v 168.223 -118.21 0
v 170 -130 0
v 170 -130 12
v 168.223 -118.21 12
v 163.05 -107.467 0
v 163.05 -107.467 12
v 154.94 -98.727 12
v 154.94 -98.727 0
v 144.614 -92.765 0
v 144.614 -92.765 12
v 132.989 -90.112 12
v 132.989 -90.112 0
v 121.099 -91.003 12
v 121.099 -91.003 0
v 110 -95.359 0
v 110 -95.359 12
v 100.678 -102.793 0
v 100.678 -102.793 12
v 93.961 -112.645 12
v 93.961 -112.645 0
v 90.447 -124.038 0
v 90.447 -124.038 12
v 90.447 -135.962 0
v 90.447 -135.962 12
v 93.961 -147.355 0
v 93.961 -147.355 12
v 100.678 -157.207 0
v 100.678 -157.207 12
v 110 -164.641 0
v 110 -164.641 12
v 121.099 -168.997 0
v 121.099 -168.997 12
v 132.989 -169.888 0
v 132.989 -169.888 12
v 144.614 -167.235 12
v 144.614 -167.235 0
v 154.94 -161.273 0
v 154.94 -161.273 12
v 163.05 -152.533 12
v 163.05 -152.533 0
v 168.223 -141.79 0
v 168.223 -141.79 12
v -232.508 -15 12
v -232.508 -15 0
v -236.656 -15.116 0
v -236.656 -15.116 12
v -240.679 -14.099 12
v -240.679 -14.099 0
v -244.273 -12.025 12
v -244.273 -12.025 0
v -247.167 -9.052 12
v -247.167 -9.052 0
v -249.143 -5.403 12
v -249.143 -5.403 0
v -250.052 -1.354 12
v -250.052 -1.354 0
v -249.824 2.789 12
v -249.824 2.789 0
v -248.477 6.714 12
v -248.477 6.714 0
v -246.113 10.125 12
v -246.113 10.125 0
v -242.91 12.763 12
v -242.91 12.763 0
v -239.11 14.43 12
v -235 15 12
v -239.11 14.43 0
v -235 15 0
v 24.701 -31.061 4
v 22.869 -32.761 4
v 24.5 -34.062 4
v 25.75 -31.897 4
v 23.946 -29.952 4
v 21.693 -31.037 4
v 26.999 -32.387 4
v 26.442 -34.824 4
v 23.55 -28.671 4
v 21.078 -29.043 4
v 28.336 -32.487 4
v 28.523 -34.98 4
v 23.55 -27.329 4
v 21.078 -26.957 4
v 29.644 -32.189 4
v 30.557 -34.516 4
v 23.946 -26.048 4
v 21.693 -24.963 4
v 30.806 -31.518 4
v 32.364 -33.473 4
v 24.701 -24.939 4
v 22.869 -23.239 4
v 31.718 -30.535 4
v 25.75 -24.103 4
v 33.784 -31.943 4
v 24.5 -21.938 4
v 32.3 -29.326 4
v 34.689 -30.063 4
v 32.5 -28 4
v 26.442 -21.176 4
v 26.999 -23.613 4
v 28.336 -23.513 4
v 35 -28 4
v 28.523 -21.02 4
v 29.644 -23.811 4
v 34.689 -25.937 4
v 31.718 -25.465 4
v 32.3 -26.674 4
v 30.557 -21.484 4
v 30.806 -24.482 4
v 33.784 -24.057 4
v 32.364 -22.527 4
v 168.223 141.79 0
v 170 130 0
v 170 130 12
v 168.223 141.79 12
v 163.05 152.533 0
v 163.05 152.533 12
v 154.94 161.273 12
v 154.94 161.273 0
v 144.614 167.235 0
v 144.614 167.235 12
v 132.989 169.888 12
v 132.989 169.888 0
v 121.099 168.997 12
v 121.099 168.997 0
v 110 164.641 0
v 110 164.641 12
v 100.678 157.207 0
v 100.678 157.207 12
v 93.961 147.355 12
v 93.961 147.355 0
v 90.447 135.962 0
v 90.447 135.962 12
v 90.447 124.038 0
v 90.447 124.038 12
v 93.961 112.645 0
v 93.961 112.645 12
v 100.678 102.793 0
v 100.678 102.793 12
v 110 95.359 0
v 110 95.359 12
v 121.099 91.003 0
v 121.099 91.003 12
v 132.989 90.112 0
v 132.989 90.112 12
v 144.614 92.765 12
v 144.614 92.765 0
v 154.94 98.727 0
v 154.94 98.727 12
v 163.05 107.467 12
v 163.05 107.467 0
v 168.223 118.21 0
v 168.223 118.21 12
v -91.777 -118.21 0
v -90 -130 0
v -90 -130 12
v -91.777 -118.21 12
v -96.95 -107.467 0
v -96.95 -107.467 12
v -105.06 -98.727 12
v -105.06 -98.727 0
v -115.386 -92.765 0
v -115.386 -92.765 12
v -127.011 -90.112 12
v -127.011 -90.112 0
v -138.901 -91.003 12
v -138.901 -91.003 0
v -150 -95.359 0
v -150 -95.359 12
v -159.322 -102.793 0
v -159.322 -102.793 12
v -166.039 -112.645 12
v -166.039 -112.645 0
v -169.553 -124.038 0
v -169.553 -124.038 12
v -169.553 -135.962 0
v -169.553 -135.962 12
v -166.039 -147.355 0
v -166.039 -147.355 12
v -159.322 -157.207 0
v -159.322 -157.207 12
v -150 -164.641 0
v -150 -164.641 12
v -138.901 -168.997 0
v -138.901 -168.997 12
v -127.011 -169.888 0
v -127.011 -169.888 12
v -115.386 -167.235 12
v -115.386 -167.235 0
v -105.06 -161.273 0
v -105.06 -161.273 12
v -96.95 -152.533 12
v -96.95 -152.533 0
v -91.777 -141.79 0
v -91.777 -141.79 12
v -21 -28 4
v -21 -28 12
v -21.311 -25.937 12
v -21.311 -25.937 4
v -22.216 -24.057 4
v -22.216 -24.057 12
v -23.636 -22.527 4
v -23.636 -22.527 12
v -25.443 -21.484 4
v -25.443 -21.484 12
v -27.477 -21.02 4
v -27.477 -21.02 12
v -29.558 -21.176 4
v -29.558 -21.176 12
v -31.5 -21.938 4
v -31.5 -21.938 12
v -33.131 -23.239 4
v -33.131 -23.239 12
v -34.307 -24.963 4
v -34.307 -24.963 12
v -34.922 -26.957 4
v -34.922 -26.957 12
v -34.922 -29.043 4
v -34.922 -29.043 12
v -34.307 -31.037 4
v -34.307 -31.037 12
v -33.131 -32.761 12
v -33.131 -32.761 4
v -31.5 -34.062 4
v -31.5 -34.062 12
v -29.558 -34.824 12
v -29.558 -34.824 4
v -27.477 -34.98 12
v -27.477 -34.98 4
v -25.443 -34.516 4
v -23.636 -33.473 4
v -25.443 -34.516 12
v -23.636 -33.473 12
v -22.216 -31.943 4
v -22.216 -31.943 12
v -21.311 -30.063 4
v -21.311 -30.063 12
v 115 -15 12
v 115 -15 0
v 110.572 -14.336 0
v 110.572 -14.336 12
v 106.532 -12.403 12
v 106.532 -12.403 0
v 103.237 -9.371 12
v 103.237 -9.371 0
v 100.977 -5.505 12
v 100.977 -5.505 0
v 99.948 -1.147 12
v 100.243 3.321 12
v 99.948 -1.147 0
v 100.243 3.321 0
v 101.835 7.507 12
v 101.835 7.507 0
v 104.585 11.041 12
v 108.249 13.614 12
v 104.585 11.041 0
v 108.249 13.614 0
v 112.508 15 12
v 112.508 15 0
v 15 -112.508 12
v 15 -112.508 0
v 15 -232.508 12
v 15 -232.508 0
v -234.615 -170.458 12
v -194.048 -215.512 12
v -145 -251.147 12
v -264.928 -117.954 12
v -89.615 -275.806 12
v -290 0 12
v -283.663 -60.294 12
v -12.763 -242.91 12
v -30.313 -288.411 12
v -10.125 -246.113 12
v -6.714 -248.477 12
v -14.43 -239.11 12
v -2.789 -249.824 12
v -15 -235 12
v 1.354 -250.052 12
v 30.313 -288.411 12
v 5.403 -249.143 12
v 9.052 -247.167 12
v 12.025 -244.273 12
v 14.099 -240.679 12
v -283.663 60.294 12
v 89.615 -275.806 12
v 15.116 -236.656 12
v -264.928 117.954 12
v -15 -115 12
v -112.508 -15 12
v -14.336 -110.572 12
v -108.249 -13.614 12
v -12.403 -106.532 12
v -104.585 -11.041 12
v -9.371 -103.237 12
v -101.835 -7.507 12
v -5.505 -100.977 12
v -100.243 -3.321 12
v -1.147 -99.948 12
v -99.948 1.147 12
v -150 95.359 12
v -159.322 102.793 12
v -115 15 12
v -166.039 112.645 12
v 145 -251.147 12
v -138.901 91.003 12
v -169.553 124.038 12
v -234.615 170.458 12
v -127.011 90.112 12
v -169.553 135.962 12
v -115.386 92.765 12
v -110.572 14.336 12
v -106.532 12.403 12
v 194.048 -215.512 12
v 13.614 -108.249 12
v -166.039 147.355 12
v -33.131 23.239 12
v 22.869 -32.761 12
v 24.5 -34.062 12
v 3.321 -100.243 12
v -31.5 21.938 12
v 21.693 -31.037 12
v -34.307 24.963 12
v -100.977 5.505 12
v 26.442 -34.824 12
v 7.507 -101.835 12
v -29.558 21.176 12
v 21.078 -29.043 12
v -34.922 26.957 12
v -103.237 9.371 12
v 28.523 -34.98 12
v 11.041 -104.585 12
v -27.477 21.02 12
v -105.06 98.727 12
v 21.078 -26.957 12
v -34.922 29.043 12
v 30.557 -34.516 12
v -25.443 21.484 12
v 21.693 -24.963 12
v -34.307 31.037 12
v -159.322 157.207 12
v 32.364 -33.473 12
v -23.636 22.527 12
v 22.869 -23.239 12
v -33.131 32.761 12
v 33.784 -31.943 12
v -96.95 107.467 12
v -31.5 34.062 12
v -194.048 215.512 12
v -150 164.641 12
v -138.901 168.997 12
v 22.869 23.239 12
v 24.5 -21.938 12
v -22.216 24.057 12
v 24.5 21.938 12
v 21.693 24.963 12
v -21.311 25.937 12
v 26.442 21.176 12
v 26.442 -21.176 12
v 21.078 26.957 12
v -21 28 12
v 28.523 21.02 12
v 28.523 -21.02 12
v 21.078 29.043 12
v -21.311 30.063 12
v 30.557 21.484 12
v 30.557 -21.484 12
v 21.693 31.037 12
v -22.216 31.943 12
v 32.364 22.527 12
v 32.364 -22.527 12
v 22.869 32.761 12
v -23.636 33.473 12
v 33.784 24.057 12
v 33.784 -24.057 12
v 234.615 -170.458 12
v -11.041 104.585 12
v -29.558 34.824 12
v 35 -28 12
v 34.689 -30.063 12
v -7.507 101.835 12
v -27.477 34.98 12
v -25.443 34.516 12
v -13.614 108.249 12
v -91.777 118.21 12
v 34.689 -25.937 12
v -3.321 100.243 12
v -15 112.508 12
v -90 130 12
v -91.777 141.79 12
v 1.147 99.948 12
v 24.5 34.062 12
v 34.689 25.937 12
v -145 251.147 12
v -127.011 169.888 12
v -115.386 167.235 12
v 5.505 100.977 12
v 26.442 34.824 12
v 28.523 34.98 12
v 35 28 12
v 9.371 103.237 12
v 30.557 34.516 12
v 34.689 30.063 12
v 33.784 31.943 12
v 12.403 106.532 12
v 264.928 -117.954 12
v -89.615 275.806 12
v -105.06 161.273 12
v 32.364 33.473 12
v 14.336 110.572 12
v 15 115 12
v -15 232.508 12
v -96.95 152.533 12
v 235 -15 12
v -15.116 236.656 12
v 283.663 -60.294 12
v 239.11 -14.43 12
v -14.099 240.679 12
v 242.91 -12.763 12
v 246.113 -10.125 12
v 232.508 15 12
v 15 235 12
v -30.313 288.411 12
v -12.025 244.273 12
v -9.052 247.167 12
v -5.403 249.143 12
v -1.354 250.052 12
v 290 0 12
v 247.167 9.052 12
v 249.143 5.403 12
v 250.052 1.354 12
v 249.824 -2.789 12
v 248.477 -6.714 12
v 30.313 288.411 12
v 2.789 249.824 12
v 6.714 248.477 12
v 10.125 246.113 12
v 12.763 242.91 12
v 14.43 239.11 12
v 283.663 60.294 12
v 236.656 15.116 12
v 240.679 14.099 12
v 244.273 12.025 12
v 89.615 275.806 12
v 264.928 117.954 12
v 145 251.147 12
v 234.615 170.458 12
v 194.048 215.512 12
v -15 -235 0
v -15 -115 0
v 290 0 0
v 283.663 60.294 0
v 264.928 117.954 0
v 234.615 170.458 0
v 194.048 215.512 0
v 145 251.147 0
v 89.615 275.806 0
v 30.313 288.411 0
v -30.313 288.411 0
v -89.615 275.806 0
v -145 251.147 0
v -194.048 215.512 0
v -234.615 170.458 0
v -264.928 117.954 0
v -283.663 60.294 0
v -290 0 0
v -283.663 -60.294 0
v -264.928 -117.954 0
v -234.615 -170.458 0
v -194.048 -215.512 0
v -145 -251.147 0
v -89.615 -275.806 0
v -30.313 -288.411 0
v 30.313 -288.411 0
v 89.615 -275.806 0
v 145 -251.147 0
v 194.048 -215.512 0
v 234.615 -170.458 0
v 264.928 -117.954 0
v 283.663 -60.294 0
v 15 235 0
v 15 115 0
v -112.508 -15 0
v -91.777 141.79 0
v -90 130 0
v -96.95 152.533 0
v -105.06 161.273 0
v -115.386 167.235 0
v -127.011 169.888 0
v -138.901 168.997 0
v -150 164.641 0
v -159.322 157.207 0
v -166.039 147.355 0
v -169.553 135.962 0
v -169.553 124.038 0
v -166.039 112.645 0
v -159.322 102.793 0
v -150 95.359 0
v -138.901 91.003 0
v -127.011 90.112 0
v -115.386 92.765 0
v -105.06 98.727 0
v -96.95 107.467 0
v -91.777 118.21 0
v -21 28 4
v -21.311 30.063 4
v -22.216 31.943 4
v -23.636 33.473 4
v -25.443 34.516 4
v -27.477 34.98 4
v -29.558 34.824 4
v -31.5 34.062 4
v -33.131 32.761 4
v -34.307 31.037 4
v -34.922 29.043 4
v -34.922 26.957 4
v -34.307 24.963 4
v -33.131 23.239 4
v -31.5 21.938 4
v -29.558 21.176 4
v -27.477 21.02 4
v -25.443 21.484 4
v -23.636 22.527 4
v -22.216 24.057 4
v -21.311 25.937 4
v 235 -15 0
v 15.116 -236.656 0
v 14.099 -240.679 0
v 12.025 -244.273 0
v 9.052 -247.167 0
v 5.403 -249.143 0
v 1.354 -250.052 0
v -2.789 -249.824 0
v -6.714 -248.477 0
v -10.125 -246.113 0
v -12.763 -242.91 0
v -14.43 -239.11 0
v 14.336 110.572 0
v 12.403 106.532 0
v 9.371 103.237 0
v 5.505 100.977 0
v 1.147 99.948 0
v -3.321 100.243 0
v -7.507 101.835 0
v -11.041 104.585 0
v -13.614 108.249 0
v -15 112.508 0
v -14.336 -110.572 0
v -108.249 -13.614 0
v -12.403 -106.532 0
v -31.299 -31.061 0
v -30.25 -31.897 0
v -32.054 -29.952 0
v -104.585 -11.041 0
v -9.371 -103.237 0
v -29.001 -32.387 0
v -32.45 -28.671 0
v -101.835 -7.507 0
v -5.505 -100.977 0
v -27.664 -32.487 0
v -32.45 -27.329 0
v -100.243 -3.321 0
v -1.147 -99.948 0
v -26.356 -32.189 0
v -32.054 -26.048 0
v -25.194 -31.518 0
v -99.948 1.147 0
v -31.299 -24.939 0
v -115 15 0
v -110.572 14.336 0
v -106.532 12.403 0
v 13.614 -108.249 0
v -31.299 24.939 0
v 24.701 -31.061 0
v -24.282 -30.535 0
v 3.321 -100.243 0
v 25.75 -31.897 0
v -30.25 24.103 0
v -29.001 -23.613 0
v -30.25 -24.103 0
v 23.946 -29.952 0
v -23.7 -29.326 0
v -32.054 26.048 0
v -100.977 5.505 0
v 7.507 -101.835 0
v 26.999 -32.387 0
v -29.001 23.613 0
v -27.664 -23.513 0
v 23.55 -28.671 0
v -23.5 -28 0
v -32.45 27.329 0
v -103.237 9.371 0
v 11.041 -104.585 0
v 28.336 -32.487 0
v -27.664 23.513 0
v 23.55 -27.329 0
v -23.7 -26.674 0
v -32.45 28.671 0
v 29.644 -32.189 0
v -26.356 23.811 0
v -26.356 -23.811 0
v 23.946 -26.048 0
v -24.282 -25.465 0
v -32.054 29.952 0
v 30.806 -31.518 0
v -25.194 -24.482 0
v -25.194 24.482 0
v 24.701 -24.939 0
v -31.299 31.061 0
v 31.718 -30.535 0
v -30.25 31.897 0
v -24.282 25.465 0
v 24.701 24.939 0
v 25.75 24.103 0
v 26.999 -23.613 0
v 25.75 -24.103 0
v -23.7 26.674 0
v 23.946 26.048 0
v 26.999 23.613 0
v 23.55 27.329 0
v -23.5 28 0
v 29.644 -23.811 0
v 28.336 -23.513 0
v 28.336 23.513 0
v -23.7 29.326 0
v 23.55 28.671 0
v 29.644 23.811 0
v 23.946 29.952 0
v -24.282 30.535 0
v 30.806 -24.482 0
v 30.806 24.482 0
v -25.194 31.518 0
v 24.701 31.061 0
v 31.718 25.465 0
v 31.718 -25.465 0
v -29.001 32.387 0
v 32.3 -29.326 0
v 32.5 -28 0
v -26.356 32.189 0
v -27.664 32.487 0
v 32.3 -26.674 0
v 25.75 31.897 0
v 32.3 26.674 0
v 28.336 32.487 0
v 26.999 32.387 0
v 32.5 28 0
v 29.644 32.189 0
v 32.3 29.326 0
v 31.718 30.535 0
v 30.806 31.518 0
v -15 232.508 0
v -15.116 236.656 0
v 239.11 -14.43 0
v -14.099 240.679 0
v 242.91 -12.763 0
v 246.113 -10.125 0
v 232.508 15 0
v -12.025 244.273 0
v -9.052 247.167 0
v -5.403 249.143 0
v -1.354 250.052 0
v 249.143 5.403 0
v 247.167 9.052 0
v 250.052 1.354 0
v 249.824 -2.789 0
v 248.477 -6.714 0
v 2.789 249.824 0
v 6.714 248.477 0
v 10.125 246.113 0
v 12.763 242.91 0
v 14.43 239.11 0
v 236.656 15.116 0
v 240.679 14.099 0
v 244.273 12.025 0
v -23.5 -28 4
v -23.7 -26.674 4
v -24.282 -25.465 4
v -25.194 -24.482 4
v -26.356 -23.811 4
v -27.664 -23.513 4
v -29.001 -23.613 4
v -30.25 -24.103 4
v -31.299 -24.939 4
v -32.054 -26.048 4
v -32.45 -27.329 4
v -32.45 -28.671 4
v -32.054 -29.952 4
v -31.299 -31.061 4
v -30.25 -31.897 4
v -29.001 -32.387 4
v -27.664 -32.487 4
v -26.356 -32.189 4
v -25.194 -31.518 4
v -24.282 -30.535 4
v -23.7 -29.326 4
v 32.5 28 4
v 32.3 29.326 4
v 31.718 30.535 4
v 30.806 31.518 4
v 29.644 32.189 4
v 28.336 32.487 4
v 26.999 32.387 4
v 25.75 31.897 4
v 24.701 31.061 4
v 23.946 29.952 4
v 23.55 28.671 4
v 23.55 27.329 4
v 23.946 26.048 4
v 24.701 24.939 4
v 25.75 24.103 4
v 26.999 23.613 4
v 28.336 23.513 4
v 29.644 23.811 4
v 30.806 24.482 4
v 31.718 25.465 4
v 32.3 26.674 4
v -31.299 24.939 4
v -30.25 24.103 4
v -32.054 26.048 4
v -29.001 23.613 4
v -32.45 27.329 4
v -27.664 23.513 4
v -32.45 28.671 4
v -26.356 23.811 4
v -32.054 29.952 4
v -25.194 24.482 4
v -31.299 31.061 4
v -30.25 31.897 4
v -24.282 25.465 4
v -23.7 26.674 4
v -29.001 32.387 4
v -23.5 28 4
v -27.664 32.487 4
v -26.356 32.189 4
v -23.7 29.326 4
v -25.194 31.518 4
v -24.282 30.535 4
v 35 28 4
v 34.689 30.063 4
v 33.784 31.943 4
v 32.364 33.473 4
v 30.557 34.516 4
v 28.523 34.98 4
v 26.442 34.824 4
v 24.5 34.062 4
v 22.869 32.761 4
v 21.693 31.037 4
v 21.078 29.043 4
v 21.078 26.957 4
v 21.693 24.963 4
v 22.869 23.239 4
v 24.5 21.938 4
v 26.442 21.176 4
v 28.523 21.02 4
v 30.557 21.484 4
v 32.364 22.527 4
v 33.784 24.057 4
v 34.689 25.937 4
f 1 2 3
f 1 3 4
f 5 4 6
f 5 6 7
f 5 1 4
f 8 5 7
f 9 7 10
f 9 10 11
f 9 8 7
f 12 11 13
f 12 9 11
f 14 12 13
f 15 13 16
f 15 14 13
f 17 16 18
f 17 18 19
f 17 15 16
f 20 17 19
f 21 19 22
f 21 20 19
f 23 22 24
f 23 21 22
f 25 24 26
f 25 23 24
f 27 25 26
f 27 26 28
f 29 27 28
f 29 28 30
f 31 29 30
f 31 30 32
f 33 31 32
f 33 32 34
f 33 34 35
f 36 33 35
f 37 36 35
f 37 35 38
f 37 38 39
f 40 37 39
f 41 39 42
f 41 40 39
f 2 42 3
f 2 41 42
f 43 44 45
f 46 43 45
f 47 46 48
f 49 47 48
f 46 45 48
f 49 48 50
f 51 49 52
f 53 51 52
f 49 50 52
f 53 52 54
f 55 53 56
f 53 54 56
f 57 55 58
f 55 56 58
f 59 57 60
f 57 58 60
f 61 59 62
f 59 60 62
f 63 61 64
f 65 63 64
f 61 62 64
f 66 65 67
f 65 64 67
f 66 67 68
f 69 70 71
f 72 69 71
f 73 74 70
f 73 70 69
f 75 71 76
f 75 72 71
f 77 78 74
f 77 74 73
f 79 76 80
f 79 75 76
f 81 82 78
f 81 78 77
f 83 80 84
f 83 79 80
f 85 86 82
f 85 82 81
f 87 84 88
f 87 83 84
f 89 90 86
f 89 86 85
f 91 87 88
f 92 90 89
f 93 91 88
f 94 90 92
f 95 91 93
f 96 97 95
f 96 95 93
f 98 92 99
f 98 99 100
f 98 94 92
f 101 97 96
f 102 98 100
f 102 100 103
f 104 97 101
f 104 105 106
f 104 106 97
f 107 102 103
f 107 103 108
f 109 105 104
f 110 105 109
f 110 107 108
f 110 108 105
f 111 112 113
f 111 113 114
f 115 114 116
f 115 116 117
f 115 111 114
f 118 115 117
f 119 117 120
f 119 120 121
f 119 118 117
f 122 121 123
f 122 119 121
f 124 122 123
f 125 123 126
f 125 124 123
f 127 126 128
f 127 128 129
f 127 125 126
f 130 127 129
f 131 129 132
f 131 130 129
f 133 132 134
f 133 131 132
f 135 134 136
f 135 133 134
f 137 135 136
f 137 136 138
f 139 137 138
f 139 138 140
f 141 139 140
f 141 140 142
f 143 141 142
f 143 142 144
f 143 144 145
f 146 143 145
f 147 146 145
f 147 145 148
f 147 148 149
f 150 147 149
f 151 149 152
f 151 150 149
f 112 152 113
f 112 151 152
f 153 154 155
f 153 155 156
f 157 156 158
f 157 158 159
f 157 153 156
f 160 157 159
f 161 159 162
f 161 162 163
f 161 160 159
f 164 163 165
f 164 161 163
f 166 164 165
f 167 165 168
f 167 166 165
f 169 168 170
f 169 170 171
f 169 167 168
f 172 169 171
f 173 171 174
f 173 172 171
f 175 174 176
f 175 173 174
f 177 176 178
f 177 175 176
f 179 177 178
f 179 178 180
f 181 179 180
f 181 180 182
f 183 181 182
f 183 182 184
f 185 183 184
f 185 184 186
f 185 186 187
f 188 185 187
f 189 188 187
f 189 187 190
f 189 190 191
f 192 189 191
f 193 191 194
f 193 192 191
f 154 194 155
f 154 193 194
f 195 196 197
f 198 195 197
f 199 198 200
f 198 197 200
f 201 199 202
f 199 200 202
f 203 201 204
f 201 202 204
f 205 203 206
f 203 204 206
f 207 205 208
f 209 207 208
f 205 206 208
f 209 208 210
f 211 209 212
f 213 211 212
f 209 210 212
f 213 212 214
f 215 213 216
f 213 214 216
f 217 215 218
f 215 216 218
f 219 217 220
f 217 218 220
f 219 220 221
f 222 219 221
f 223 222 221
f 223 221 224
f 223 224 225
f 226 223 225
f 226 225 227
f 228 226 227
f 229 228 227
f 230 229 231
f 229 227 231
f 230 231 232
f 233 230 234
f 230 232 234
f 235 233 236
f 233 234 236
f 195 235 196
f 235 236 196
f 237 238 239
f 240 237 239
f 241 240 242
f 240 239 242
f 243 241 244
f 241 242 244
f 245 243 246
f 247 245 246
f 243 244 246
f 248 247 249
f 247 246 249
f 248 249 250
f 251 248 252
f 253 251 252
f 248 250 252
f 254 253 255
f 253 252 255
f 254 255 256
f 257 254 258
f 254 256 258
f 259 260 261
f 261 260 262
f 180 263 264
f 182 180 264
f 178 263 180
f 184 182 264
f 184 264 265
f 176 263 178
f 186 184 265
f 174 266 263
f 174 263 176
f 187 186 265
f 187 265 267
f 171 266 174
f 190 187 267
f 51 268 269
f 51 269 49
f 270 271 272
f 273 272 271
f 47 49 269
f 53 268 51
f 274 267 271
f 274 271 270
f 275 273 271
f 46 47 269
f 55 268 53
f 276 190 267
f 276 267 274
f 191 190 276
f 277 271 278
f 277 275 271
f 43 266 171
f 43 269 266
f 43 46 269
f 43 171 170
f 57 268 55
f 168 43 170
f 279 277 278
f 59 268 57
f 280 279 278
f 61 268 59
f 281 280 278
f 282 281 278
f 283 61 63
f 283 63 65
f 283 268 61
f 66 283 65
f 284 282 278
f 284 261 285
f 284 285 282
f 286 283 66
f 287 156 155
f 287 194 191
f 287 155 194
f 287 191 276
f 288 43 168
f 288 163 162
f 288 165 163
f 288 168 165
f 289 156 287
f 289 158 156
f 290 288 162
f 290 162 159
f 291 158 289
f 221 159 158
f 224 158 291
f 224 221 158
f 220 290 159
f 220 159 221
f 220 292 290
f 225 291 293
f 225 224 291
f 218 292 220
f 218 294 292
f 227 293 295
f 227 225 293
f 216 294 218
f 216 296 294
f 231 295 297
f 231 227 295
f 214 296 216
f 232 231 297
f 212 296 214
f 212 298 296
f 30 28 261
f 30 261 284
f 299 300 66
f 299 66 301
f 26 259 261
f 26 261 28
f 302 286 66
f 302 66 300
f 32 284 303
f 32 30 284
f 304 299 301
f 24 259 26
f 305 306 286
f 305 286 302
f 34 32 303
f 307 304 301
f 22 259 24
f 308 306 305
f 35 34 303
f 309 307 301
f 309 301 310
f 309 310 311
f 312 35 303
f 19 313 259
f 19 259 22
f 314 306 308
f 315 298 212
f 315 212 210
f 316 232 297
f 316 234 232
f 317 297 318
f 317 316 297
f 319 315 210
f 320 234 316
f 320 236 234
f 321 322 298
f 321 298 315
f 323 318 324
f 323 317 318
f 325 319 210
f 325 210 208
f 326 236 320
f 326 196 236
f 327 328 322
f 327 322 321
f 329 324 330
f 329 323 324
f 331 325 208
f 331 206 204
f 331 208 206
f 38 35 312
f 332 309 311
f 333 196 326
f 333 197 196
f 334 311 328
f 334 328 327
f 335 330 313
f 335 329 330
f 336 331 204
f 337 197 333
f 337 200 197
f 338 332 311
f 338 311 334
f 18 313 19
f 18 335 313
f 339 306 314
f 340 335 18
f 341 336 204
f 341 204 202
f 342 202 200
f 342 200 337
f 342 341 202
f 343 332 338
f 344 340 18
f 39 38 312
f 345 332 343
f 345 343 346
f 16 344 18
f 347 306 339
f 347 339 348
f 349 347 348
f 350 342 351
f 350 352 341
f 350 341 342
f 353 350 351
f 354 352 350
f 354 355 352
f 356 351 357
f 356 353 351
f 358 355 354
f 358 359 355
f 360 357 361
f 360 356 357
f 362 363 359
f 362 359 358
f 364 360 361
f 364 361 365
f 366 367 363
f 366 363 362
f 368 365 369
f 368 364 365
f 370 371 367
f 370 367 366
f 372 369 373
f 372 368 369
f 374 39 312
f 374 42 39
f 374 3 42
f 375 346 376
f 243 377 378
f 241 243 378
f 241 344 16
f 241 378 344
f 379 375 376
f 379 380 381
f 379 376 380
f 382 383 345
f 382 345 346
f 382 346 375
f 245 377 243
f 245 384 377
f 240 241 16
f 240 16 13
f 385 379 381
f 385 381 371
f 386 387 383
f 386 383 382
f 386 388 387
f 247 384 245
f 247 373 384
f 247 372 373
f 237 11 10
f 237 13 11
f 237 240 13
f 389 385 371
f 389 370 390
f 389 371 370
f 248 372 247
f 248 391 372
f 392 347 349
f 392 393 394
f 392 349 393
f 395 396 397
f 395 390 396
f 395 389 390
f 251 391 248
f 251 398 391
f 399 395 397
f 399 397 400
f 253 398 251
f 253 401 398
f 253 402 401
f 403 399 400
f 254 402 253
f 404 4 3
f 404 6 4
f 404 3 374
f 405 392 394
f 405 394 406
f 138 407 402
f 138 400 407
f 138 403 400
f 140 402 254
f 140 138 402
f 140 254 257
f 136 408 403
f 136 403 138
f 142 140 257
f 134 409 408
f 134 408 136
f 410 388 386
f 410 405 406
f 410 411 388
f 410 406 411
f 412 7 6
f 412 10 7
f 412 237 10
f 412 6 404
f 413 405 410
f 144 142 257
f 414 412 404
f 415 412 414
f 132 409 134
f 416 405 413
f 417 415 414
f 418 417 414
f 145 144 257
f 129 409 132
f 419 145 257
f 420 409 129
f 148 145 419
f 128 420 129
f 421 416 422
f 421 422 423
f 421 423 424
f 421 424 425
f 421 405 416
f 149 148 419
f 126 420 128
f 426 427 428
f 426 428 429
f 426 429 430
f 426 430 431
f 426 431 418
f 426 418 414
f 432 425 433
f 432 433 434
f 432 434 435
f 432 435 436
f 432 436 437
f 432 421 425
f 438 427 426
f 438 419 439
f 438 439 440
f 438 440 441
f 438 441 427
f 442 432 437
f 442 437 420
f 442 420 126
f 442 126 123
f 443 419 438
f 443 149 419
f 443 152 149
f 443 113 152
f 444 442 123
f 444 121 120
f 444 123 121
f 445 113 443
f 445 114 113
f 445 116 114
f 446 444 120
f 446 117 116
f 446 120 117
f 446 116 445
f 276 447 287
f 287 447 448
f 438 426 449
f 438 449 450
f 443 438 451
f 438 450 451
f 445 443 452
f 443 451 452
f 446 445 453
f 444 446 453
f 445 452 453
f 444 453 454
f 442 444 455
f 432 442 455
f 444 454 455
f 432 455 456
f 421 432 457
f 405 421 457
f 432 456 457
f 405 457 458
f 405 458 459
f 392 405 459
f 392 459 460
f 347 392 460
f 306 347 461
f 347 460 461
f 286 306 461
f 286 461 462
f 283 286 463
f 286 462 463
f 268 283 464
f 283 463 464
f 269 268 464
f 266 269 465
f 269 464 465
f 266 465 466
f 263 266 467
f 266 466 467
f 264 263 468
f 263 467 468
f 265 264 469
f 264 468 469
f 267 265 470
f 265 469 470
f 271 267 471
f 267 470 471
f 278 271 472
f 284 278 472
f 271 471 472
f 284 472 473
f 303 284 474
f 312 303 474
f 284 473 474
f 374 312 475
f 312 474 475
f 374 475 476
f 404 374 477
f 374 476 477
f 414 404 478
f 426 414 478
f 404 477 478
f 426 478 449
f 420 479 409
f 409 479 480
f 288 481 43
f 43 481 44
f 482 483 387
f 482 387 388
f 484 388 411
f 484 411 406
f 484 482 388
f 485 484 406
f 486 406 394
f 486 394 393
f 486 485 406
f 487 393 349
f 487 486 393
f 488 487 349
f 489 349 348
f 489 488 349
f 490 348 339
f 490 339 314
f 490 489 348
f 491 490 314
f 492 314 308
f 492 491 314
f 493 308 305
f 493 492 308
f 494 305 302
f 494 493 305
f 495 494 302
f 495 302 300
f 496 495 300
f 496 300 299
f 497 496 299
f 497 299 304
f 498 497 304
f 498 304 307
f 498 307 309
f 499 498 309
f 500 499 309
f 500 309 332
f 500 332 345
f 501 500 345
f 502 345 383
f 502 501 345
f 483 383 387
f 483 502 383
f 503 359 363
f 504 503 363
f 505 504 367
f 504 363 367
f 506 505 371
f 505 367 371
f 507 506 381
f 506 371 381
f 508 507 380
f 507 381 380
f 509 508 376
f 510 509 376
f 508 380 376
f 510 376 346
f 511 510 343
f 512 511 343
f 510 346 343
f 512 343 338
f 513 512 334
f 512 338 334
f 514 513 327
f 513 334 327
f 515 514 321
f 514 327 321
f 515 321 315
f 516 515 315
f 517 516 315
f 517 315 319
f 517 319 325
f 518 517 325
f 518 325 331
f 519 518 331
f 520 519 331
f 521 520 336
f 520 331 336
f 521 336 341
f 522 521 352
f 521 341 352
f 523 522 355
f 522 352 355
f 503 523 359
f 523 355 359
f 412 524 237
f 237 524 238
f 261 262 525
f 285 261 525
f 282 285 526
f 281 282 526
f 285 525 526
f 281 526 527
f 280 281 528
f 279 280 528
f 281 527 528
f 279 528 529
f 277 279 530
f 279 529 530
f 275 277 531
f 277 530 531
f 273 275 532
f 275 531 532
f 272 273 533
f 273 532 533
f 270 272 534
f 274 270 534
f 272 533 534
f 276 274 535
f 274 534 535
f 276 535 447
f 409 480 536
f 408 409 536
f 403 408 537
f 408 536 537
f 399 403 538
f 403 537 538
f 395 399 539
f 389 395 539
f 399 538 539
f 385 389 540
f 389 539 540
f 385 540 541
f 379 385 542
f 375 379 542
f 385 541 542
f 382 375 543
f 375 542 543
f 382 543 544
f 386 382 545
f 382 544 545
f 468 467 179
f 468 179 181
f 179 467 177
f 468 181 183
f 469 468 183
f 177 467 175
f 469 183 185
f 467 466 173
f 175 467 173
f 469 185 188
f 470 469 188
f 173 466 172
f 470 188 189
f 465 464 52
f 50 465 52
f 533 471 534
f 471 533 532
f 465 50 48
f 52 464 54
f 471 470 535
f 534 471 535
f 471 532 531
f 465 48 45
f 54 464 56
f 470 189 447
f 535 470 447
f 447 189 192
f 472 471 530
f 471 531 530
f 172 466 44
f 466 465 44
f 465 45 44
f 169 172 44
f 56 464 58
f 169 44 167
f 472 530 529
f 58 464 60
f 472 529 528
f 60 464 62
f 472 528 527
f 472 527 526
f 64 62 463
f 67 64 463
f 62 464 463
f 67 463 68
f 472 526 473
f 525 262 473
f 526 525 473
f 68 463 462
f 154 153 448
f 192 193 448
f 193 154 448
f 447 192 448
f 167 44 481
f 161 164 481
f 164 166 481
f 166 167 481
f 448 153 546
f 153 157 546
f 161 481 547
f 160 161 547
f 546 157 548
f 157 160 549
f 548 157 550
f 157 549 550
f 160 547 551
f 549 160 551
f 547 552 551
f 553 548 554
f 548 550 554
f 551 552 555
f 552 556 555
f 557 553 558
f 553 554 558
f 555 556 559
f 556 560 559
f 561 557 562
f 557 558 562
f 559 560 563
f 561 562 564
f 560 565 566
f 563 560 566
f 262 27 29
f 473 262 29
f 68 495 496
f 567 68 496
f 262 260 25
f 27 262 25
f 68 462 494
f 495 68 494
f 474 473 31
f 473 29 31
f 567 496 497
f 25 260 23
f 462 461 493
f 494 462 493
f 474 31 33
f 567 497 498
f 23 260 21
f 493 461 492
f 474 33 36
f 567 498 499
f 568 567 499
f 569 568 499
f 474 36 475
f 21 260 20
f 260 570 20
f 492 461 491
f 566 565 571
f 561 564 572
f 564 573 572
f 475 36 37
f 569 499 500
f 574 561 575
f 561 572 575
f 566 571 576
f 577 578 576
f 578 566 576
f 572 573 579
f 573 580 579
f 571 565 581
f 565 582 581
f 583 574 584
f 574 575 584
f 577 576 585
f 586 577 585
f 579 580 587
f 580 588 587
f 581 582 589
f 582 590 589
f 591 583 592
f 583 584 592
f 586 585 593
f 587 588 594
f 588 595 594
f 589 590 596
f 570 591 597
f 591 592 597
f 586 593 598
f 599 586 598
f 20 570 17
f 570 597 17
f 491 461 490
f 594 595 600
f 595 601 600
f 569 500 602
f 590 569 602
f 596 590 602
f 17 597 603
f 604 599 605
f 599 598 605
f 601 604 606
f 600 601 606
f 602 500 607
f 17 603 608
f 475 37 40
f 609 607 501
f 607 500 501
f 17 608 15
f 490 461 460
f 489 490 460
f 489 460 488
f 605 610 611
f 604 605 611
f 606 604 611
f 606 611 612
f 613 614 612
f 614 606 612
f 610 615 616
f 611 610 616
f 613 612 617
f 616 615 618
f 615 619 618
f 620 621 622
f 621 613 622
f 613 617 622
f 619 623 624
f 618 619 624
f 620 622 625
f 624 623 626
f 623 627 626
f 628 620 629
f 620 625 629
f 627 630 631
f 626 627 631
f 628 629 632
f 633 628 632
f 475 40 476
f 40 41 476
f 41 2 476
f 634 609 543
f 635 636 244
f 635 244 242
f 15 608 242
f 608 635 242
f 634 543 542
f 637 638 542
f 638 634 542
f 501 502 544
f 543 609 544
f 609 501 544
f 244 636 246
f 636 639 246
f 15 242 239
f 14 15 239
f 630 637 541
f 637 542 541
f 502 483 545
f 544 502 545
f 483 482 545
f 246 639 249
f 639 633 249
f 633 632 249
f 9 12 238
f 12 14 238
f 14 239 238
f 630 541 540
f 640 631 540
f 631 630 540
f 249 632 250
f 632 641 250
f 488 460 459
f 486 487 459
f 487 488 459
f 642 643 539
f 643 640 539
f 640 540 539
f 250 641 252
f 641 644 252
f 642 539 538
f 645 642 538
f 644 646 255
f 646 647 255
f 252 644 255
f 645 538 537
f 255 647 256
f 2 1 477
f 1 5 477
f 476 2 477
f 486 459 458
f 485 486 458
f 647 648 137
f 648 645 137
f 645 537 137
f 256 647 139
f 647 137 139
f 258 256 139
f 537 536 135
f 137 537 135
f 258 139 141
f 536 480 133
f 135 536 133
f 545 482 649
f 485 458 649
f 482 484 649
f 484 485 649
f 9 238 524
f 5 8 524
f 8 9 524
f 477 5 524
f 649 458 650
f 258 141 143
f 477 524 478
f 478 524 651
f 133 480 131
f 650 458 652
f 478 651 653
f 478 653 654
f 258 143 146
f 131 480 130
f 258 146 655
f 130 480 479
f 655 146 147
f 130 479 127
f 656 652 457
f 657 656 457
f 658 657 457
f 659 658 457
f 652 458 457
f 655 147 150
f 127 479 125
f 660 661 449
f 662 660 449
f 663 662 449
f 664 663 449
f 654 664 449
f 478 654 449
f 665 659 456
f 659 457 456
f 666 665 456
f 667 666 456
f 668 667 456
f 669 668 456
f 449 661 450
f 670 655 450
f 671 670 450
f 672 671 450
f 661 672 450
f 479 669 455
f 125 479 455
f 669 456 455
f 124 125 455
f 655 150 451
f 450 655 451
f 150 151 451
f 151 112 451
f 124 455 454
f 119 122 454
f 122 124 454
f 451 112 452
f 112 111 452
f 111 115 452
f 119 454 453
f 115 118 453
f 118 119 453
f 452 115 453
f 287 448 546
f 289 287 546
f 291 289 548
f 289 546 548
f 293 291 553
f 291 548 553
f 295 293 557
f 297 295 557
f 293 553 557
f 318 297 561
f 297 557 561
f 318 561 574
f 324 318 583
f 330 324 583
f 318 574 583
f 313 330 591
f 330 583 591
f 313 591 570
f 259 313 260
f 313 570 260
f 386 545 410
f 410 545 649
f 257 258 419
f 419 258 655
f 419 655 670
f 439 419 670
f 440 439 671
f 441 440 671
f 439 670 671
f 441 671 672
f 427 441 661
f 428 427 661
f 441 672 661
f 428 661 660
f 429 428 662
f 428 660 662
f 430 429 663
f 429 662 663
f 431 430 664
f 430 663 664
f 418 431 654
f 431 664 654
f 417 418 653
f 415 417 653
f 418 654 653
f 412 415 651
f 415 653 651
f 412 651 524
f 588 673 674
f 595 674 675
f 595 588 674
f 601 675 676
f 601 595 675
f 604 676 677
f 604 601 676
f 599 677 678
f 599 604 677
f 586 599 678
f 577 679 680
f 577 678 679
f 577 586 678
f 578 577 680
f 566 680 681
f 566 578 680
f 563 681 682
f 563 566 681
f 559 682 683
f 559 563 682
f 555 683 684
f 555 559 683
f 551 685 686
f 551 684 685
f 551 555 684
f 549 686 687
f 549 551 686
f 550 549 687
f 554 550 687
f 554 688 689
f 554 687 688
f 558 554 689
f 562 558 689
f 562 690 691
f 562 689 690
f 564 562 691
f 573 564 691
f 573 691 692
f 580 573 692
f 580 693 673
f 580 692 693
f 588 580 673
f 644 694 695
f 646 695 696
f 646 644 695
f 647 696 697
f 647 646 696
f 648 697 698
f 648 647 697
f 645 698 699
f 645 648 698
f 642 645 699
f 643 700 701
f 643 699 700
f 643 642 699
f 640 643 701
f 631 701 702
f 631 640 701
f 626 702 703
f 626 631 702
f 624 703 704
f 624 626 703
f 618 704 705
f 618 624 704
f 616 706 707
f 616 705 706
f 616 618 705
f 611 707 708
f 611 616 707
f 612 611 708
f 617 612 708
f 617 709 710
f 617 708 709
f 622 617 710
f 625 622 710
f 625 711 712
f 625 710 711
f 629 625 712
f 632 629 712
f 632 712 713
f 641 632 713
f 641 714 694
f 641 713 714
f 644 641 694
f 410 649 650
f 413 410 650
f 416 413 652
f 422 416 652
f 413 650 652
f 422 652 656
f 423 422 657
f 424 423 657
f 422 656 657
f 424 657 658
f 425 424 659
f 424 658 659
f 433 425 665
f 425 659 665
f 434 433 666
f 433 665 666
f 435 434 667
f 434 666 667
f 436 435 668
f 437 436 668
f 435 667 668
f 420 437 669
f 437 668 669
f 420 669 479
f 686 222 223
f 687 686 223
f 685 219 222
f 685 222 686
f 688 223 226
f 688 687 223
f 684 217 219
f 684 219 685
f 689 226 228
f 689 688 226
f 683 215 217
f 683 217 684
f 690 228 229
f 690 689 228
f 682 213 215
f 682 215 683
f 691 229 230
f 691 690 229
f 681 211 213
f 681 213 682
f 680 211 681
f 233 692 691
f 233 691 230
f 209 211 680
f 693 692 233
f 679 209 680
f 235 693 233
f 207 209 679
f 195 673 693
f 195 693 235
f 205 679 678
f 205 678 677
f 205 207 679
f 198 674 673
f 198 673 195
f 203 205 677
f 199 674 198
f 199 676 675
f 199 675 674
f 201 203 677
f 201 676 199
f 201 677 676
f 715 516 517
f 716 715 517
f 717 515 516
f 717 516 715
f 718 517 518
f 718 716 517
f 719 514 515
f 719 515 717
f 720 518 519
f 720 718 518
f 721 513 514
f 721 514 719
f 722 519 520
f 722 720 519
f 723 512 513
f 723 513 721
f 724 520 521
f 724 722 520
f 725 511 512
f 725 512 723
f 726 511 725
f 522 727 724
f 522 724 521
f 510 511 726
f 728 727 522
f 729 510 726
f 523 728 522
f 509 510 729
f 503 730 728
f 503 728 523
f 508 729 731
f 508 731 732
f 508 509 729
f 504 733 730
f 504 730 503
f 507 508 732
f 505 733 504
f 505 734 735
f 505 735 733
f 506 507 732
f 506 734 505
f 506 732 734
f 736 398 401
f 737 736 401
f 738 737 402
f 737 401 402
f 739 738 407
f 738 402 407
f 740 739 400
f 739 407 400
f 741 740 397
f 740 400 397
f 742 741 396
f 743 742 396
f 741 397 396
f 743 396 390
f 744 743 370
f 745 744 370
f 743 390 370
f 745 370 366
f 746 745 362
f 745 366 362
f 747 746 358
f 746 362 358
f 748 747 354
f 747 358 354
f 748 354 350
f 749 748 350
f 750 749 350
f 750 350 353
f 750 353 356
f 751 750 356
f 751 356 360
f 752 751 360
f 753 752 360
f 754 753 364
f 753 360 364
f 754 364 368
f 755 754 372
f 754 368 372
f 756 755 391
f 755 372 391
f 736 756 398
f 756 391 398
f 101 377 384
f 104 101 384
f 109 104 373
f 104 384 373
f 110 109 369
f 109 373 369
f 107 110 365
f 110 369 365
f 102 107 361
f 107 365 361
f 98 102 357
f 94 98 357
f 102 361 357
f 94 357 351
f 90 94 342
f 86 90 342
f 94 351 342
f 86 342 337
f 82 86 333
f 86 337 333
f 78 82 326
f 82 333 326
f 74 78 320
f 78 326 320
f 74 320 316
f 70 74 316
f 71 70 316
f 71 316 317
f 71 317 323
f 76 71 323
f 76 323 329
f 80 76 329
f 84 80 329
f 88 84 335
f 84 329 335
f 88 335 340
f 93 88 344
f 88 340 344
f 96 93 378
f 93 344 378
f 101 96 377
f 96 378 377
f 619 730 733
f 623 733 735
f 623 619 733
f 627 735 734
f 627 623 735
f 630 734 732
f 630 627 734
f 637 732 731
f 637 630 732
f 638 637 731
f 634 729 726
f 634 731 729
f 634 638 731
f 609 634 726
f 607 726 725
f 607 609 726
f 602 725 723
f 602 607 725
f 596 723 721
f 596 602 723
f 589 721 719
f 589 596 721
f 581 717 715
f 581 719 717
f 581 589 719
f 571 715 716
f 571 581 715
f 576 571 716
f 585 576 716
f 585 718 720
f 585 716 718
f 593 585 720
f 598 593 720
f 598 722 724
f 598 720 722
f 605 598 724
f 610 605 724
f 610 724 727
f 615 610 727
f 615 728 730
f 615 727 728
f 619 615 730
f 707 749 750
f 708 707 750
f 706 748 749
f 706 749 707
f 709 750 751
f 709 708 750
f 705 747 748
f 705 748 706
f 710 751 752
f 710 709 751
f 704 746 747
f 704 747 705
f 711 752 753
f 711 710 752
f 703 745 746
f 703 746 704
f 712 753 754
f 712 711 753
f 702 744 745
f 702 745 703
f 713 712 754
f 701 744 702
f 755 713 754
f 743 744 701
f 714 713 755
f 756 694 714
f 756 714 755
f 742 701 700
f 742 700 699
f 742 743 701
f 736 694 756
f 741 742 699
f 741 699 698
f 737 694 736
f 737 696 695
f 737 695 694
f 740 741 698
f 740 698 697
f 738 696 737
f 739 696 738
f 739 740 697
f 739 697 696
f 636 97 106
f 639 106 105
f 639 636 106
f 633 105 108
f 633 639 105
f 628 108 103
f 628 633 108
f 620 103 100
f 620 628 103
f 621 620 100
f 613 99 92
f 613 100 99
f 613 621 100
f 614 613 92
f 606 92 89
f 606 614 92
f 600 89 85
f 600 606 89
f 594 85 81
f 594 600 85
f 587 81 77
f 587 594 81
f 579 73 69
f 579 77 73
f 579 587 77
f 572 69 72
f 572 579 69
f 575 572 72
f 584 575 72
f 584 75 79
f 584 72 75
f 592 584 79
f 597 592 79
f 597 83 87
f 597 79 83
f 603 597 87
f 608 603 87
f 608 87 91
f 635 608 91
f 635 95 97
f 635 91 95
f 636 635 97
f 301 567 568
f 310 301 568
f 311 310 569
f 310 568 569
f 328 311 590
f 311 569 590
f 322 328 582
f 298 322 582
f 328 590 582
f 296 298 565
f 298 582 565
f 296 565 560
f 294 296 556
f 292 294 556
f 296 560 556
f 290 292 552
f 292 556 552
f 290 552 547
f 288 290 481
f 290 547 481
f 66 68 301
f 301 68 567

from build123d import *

# Parameters (mm, degrees)
F0_R     = 290
F0_R_2   = 40
F0_R_3   = 4.5
F1_DEPTH = 12
F2_DEPTH = 25
F3_R     = 7
F4_DEPTH = 8


with BuildPart() as f1:
    # F0 (on Top) → F1 (new body)
    with BuildSketch(Plane.XY):
        Circle(F0_R)
        with BuildLine():
            Line((-235, 15), (-115, 15))
            ThreePointArc((-115, 15), (-99.948323, 1.146943), (-112.507639, -15))
            Line((-112.507639, -15), (-232.507639, -15))
            ThreePointArc((-232.507639, -15), (-250.051677, -1.354005), (-235, 15))
        make_face(mode=Mode.SUBTRACT)
        with Locations((-130, -130)):
            Circle(F0_R_2, mode=Mode.SUBTRACT)
        with Locations((-28, -28)):
            Circle(F0_R_3, mode=Mode.SUBTRACT)
        with BuildLine():
            Line((-15, -235), (-15, -115))
            ThreePointArc((-15, -115), (-1.146943, -99.948323), (15, -112.507639))
            Line((15, -112.507639), (15, -232.507639))
            ThreePointArc((15, -232.507639), (1.354005, -250.051677), (-15, -235))
        make_face(mode=Mode.SUBTRACT)
        with Locations((130, -130)):
            Circle(F0_R_2, mode=Mode.SUBTRACT)
        with Locations((28, -28)):
            Circle(F0_R_3, mode=Mode.SUBTRACT)
        with Locations((-28, 28)):
            Circle(F0_R_3, mode=Mode.SUBTRACT)
        with Locations((-130, 130)):
            Circle(F0_R_2, mode=Mode.SUBTRACT)
        with BuildLine():
            Line((15, 235), (15, 115))
            ThreePointArc((15, 115), (1.146943, 99.948323), (-15, 112.507639))
            Line((-15, 112.507639), (-15, 232.507639))
            ThreePointArc((-15, 232.507639), (-1.354005, 250.051677), (15, 235))
        make_face(mode=Mode.SUBTRACT)
        with Locations((28, 28)):
            Circle(F0_R_3, mode=Mode.SUBTRACT)
        with Locations((130, 130)):
            Circle(F0_R_2, mode=Mode.SUBTRACT)
        with BuildLine():
            Line((235, -15), (115, -15))
            ThreePointArc((115, -15), (99.948323, -1.146943), (112.507639, 15))
            Line((112.507639, 15), (232.507639, 15))
            ThreePointArc((232.507639, 15), (250.051677, 1.354005), (235, -15))
        make_face(mode=Mode.SUBTRACT)
    extrude(amount=F1_DEPTH)

    # F0 (on Top) → F2 (cut)
    with BuildSketch(Plane.XY):
        Circle(F0_R)
        with BuildLine():
            Line((-235, 15), (-115, 15))
            ThreePointArc((-115, 15), (-99.948323, 1.146943), (-112.507639, -15))
            Line((-112.507639, -15), (-232.507639, -15))
            ThreePointArc((-232.507639, -15), (-250.051677, -1.354005), (-235, 15))
        make_face(mode=Mode.SUBTRACT)
        with Locations((-130, -130)):
            Circle(F0_R_2, mode=Mode.SUBTRACT)
        with Locations((-28, -28)):
            Circle(F0_R_3, mode=Mode.SUBTRACT)
        with BuildLine():
            Line((-15, -235), (-15, -115))
            ThreePointArc((-15, -115), (-1.146943, -99.948323), (15, -112.507639))
            Line((15, -112.507639), (15, -232.507639))
            ThreePointArc((15, -232.507639), (1.354005, -250.051677), (-15, -235))
        make_face(mode=Mode.SUBTRACT)
        with Locations((130, -130)):
            Circle(F0_R_2, mode=Mode.SUBTRACT)
        with Locations((28, -28)):
            Circle(F0_R_3, mode=Mode.SUBTRACT)
        with Locations((-28, 28)):
            Circle(F0_R_3, mode=Mode.SUBTRACT)
        with Locations((-130, 130)):
            Circle(F0_R_2, mode=Mode.SUBTRACT)
        with BuildLine():
            Line((15, 235), (15, 115))
            ThreePointArc((15, 115), (1.146943, 99.948323), (-15, 112.507639))
            Line((-15, 112.507639), (-15, 232.507639))
            ThreePointArc((-15, 232.507639), (-1.354005, 250.051677), (15, 235))
        make_face(mode=Mode.SUBTRACT)
        with Locations((28, 28)):
            Circle(F0_R_3, mode=Mode.SUBTRACT)
        with Locations((130, 130)):
            Circle(F0_R_2, mode=Mode.SUBTRACT)
        with BuildLine():
            Line((235, -15), (115, -15))
            ThreePointArc((115, -15), (99.948323, -1.146943), (112.507639, 15))
            Line((112.507639, 15), (232.507639, 15))
            ThreePointArc((232.507639, 15), (250.051677, 1.354005), (235, -15))
        make_face(mode=Mode.SUBTRACT)
    extrude(amount=-F2_DEPTH, mode=Mode.SUBTRACT)

    # F3 (on face) → F4 (cut)
    with BuildSketch(Plane.XY.offset(12)):
        with Locations((-28, 28)):
            Circle(F3_R)
        with Locations((28, 28)):
            Circle(F3_R)
        with Locations((-28, -28)):
            Circle(F3_R)
        with Locations((28, -28)):
            Circle(F3_R)
    extrude(amount=-F4_DEPTH, mode=Mode.SUBTRACT)


solid = f1.part
